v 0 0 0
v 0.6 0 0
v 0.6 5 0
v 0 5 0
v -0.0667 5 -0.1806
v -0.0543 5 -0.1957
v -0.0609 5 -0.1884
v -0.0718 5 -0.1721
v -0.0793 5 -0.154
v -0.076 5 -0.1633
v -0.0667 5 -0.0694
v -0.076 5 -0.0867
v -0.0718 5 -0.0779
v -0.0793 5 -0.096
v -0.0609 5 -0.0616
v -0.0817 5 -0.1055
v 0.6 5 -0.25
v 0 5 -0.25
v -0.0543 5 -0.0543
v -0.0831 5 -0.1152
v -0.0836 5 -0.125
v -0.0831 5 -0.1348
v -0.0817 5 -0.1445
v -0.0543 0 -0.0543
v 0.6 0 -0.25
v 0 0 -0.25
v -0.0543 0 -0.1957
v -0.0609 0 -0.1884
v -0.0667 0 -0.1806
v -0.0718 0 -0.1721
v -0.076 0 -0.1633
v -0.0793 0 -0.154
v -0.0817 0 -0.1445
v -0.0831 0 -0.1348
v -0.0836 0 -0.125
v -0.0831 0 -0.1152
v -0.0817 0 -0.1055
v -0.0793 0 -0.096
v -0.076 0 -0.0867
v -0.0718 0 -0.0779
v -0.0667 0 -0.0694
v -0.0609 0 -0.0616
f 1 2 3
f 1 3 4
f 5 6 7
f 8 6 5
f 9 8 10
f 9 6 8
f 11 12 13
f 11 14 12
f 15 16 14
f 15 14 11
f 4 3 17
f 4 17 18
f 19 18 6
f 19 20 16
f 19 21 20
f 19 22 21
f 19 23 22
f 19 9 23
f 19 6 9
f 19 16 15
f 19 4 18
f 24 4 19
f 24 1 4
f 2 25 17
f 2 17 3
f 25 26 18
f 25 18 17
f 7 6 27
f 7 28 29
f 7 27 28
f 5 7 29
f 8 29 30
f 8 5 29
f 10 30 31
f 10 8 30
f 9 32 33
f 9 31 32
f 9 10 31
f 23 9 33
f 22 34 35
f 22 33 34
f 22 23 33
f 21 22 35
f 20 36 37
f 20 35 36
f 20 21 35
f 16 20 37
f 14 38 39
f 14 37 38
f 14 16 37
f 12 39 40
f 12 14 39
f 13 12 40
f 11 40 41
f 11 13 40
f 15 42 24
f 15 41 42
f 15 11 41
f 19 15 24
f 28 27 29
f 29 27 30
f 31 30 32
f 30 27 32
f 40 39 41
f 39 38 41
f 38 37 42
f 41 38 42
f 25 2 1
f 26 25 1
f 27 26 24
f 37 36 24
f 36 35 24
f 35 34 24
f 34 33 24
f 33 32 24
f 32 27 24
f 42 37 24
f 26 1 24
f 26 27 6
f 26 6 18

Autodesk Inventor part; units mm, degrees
ref_plane "YZ Plane" through (0, 0, 0) normal (1, 0, 0) x (0, 1, 0)
ref_plane "XZ Plane" through (0, 0, 0) normal (0, 1, 0) x (-1, 0, 0)
ref_plane "XY Plane" through (0, 0, 0) normal (0, 0, 1) x (1, 0, 0)
sketch "草圖1" plane through (0, 0, 0) normal (0, 1, 0) x (-1, 0, 0)
  line L0 (0, 0) -> (0, -0.25)
  line L1 (0, 0) -> (0, -0.25)
  line L2 (0, -0.25) -> (-0.6, -0.25)
  line L3 (-0.6, -0.25) -> (-0.6, 0)
  line L4 (-0.6, 0) -> (0, 0)
  line L5 (0, 0) -> (0.125, -0.125)
  line L6 (0.125, -0.125) -> (0, -0.25)
  dimension "d0" = 0.25
  dimension "d1" = 0.6
  dimension "d2" = 45
extrude "擠出1" add sketch "草圖1" along normal blind 5
fillet "圓角1" radius 0.1 1 edges at (-0.125, 2.5, -0.125)
properties part number "窗側柱_無底"
